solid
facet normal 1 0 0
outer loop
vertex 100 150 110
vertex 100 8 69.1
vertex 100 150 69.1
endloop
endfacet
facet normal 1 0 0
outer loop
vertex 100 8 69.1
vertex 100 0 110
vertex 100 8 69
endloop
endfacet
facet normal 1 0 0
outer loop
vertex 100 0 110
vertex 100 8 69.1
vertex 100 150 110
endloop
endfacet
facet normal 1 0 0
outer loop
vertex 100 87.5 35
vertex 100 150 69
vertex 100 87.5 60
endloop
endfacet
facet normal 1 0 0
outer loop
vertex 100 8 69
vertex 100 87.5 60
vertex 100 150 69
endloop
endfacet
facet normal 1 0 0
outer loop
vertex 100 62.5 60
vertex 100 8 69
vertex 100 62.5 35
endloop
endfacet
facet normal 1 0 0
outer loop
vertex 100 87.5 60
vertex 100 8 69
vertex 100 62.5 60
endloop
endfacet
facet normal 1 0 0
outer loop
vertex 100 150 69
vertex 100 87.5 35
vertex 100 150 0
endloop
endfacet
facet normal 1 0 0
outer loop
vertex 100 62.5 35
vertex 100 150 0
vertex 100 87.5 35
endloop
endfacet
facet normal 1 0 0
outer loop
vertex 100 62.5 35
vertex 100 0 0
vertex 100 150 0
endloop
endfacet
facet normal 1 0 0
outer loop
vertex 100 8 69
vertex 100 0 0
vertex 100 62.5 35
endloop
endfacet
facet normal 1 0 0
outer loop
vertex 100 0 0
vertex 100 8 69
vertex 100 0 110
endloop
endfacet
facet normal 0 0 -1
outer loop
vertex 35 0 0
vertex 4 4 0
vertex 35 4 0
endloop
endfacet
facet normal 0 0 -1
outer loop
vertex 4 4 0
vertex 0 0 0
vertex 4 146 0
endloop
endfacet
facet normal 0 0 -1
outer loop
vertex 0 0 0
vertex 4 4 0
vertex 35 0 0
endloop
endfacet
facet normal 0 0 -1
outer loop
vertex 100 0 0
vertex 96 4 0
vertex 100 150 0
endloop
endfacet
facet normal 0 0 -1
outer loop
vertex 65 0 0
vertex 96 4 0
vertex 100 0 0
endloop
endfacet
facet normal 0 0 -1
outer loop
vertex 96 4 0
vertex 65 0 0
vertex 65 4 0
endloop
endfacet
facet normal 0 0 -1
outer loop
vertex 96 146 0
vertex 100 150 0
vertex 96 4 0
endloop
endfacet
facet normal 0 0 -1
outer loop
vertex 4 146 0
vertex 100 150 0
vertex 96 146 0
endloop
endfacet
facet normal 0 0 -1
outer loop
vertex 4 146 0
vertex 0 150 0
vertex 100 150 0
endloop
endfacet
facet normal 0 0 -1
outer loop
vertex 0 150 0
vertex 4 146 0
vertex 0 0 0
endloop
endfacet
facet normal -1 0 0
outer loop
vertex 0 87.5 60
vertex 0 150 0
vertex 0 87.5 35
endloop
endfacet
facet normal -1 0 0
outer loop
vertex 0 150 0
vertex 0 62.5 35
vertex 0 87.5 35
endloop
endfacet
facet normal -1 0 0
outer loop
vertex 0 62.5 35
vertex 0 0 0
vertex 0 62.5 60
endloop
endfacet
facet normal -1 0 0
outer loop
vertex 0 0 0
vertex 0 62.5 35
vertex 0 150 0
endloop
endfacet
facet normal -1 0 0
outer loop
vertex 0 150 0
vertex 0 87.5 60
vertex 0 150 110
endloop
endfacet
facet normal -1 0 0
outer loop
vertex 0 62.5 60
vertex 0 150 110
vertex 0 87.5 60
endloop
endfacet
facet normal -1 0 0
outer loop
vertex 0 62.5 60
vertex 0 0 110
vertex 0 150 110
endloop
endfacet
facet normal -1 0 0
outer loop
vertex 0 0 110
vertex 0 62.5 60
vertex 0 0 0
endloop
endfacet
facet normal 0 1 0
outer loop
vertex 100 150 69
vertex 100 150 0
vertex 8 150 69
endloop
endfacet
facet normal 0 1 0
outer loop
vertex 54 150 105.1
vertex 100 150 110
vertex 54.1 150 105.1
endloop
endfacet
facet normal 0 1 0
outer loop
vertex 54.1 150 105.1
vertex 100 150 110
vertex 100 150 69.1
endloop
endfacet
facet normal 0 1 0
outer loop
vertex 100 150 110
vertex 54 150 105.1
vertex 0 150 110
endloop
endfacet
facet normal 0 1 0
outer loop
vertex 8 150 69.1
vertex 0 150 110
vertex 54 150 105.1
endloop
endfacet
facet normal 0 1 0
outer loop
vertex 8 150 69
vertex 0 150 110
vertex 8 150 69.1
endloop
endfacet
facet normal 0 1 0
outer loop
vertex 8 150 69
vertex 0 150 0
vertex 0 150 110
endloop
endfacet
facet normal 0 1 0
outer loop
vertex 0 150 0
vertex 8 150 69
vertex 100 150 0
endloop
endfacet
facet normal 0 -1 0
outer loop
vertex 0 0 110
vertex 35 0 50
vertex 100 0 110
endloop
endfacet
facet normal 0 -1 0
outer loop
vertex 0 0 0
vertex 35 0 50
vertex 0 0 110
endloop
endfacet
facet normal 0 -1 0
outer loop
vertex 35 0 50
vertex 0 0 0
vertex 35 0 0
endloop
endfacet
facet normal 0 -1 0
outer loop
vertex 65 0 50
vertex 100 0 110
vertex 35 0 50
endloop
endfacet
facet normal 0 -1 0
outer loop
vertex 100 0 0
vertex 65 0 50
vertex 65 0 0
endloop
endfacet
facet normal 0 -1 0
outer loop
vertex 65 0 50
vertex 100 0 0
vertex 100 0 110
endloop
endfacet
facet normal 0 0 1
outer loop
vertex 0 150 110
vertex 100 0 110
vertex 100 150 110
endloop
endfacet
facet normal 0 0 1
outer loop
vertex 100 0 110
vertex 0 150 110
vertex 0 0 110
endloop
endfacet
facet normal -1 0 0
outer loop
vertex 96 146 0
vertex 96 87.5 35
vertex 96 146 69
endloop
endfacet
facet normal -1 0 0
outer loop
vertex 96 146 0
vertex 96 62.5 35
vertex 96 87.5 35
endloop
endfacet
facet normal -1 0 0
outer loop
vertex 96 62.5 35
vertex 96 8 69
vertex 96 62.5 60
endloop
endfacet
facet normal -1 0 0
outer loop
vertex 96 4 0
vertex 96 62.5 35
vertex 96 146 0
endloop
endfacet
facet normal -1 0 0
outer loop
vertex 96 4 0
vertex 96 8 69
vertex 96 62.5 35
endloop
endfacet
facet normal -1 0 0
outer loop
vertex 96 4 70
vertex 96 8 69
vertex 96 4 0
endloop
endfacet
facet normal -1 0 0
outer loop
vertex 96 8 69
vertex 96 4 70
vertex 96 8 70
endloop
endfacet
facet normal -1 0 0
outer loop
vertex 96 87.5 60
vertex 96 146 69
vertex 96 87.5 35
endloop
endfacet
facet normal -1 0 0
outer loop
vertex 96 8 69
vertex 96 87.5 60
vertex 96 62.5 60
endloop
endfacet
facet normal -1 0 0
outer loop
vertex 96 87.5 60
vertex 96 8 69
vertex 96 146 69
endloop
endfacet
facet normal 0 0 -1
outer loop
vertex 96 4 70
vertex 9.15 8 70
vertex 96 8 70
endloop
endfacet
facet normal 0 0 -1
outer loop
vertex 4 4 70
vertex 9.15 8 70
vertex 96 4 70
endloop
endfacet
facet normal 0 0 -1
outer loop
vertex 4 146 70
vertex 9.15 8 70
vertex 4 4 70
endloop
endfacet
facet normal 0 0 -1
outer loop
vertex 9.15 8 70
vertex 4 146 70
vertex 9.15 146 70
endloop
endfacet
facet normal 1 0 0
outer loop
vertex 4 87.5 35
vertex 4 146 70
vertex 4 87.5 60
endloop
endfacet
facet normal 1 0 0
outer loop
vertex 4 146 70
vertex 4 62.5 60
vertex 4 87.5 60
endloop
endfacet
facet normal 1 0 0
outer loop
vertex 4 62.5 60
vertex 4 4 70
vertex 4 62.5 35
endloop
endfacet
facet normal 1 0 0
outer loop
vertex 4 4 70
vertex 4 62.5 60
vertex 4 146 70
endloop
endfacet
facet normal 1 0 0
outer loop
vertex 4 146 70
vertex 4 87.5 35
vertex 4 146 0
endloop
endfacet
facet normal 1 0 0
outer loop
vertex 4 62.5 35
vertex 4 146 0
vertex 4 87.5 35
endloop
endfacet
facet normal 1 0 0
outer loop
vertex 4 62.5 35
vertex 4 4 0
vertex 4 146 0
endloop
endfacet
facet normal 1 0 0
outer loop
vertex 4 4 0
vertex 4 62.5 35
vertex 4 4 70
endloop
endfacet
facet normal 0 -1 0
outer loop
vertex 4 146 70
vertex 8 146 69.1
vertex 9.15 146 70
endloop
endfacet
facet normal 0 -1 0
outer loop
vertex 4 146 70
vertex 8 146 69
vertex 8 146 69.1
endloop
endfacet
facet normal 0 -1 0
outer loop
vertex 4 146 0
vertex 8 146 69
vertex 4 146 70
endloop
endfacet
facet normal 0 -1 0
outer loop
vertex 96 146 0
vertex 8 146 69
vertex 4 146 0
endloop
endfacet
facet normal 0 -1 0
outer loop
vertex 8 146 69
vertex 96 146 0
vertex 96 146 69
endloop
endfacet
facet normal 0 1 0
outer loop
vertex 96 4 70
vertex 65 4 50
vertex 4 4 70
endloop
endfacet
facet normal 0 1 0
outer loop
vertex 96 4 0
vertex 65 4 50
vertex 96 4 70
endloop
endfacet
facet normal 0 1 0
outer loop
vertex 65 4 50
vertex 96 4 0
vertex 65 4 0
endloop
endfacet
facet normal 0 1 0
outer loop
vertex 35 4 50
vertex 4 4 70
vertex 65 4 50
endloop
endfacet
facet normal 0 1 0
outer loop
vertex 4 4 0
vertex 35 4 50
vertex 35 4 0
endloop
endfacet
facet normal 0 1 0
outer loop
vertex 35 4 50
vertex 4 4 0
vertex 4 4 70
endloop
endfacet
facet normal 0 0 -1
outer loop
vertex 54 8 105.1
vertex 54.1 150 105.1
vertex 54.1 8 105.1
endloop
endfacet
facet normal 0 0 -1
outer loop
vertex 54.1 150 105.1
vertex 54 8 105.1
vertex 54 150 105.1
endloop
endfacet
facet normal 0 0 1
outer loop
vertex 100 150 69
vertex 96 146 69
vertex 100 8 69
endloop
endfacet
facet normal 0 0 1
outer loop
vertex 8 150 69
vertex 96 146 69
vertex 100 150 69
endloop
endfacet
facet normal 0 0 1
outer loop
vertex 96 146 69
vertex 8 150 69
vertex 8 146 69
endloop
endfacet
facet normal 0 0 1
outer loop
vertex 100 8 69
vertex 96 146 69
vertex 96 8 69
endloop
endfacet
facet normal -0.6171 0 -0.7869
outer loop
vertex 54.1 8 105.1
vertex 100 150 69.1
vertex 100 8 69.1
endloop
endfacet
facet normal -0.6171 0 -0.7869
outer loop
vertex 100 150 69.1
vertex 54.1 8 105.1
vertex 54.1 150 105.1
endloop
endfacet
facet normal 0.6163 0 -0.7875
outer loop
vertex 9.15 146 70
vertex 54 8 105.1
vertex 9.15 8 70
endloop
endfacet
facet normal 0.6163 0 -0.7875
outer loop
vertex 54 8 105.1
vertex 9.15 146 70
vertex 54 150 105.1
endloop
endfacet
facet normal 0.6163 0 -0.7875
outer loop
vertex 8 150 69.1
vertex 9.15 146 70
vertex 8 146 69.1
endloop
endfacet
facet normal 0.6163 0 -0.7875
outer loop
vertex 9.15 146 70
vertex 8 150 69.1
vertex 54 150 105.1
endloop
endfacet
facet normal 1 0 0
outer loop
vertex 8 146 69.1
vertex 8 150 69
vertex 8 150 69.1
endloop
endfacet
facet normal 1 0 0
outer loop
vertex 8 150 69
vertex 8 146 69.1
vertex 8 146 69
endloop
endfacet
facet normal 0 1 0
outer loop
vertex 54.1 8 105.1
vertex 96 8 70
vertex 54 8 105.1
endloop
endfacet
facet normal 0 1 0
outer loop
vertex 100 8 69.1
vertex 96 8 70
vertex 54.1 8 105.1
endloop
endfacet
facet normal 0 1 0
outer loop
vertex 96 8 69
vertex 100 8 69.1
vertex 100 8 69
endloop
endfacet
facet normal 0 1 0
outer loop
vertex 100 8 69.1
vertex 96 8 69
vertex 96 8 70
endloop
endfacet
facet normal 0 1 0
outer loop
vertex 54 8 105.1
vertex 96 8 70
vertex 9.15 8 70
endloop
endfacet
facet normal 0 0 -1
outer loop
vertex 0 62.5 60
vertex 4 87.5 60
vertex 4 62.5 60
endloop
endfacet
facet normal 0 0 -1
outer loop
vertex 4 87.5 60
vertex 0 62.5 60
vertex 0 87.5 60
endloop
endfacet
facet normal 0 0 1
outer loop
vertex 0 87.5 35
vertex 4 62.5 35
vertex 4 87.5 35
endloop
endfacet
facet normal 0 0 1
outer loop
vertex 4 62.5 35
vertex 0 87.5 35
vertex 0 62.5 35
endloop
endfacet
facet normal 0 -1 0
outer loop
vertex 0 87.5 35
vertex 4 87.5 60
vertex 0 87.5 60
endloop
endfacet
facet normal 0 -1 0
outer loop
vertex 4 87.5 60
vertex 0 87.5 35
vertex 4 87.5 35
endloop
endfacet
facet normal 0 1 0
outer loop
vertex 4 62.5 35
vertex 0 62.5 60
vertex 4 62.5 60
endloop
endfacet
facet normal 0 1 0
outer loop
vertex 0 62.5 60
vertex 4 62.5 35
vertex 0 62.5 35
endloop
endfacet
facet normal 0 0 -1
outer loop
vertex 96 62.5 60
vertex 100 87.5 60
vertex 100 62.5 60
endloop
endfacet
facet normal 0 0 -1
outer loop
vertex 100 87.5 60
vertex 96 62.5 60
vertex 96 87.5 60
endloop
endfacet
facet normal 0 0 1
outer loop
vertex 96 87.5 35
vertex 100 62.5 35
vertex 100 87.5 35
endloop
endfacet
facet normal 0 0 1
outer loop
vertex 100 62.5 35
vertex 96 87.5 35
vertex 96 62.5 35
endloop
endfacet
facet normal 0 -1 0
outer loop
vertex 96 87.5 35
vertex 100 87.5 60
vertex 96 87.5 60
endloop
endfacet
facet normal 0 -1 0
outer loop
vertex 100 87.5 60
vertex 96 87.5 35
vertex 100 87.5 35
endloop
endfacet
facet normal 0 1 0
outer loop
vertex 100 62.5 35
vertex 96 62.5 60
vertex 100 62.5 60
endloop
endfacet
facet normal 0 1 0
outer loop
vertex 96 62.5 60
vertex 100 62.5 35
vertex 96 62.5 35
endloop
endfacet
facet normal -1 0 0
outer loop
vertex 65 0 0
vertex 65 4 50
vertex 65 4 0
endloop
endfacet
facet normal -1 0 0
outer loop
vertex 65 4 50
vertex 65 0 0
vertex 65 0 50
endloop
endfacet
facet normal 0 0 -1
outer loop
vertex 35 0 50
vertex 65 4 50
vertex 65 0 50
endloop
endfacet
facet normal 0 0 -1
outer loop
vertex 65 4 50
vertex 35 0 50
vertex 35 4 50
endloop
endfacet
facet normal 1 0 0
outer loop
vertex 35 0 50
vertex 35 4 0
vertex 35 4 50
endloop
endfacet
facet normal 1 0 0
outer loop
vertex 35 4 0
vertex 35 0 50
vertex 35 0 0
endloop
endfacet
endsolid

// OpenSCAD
// ==========================================
// PARAMETRIC 3D-PRINTABLE TINY HOUSE PROJECT
// Units: Millimeters (mm)
// ==========================================

// --- Parameters ---
house_width  = 100; // X axis
house_length = 150; // Y axis
wall_height  = 70;  // Z axis wall height
wall_thickness = 4; // Optimized for 0.4mm nozzle (multiple perimeters)
roof_pitch_height = 40; // Height of the gable roof peak

// Door & Window toggles/dimensions
has_door = true;
door_width = 30;
door_height = 50;

has_window = true;
window_width = 25;
window_height = 25;

// --- Module: Main Shell ---
module house_shell() {
    difference() {
        // Outer Hull (Walls + Roof)
        union() {
            // Main rectangular body
            cube([house_width, house_length, wall_height]);
            
            // Gable Roof
            translate([0, 0, wall_height])
            polyhedron(
                points = [
                    [0, 0, 0],                                    // 0: Front-Left base
                    [house_width, 0, 0],                          // 1: Front-Right base
                    [house_width, house_length, 0],               // 2: Back-Right base
                    [0, house_length, 0],                         // 3: Back-Left base
                    [0, 0, roof_pitch_height],                    // 4: Front ridge-left peak
                    [house_width, 0, roof_pitch_height],          // 5: Front ridge-right peak
                    [house_width, house_length, roof_pitch_height], // 6: Back ridge-right peak
                    [0, house_length, roof_pitch_height]          // 7: Back ridge-left peak
                ],
                faces = [
                    [0, 1, 5, 4], // Front gable
                    [1, 2, 6, 5], // Right roof slope
                    [2, 3, 7, 6], // Back gable
                    [3, 0, 4, 7], // Left roof slope
                    [4, 5, 6, 7], // Ridge peak
                    [3, 2, 1, 0]  // Base (floor underside)
                ]
            );
        }
        
        // Inner Cavity (Hollowing out the house)
        translate([wall_thickness, wall_thickness, -1])
        union() {
            // Hollow body
            cube([
                house_width - (wall_thickness * 2), 
                house_length - (wall_thickness * 2), 
                wall_height + 1
            ]);
            
            // Hollow roof cavity (matching pitch slope)
            translate([0, 0, wall_height])
            hull() {
                translate([wall_thickness, wall_thickness, 0])
                cube([house_width - (wall_thickness * 2), house_length - (wall_thickness * 2), 0.1]);
                
                translate([house_width/2, wall_thickness, roof_pitch_height - wall_thickness])
                cube([0.1, house_length - (wall_thickness * 2), 0.1]);
            }
        }
        
        // --- Openings: Door ---
        if (has_door) {
            translate([(house_width / 2) - (door_width / 2), -1, 0])
            cube([door_width, wall_thickness + 2, door_height]);
        }
        
        // --- Openings: Windows (Side Walls) ---
        if (has_window) {
            // Left Window
            translate([-1, (house_length / 2) - (window_width / 2), wall_height / 2])
            cube([wall_thickness + 2, window_width, window_height]);
            
            // Right Window
            translate([house_width - wall_thickness - 1, (house_length / 2) - (window_width / 2), wall_height / 2])
            cube([wall_thickness + 2, window_width, window_height]);
        }
    }
}

// --- Module: Interlocking Base Flange (for multi-part printing) ---
module base_alignment_pins() {
    // Adds small alignment ridges on the bottom floor edge for modular building plates
    // (Optional use if splitting model into halves)
    interim = 2;
}

// --- Render Final Object ---
// Rotate or split here if printing in halves (e.g., slicing down the Y-axis)
house_shell();
